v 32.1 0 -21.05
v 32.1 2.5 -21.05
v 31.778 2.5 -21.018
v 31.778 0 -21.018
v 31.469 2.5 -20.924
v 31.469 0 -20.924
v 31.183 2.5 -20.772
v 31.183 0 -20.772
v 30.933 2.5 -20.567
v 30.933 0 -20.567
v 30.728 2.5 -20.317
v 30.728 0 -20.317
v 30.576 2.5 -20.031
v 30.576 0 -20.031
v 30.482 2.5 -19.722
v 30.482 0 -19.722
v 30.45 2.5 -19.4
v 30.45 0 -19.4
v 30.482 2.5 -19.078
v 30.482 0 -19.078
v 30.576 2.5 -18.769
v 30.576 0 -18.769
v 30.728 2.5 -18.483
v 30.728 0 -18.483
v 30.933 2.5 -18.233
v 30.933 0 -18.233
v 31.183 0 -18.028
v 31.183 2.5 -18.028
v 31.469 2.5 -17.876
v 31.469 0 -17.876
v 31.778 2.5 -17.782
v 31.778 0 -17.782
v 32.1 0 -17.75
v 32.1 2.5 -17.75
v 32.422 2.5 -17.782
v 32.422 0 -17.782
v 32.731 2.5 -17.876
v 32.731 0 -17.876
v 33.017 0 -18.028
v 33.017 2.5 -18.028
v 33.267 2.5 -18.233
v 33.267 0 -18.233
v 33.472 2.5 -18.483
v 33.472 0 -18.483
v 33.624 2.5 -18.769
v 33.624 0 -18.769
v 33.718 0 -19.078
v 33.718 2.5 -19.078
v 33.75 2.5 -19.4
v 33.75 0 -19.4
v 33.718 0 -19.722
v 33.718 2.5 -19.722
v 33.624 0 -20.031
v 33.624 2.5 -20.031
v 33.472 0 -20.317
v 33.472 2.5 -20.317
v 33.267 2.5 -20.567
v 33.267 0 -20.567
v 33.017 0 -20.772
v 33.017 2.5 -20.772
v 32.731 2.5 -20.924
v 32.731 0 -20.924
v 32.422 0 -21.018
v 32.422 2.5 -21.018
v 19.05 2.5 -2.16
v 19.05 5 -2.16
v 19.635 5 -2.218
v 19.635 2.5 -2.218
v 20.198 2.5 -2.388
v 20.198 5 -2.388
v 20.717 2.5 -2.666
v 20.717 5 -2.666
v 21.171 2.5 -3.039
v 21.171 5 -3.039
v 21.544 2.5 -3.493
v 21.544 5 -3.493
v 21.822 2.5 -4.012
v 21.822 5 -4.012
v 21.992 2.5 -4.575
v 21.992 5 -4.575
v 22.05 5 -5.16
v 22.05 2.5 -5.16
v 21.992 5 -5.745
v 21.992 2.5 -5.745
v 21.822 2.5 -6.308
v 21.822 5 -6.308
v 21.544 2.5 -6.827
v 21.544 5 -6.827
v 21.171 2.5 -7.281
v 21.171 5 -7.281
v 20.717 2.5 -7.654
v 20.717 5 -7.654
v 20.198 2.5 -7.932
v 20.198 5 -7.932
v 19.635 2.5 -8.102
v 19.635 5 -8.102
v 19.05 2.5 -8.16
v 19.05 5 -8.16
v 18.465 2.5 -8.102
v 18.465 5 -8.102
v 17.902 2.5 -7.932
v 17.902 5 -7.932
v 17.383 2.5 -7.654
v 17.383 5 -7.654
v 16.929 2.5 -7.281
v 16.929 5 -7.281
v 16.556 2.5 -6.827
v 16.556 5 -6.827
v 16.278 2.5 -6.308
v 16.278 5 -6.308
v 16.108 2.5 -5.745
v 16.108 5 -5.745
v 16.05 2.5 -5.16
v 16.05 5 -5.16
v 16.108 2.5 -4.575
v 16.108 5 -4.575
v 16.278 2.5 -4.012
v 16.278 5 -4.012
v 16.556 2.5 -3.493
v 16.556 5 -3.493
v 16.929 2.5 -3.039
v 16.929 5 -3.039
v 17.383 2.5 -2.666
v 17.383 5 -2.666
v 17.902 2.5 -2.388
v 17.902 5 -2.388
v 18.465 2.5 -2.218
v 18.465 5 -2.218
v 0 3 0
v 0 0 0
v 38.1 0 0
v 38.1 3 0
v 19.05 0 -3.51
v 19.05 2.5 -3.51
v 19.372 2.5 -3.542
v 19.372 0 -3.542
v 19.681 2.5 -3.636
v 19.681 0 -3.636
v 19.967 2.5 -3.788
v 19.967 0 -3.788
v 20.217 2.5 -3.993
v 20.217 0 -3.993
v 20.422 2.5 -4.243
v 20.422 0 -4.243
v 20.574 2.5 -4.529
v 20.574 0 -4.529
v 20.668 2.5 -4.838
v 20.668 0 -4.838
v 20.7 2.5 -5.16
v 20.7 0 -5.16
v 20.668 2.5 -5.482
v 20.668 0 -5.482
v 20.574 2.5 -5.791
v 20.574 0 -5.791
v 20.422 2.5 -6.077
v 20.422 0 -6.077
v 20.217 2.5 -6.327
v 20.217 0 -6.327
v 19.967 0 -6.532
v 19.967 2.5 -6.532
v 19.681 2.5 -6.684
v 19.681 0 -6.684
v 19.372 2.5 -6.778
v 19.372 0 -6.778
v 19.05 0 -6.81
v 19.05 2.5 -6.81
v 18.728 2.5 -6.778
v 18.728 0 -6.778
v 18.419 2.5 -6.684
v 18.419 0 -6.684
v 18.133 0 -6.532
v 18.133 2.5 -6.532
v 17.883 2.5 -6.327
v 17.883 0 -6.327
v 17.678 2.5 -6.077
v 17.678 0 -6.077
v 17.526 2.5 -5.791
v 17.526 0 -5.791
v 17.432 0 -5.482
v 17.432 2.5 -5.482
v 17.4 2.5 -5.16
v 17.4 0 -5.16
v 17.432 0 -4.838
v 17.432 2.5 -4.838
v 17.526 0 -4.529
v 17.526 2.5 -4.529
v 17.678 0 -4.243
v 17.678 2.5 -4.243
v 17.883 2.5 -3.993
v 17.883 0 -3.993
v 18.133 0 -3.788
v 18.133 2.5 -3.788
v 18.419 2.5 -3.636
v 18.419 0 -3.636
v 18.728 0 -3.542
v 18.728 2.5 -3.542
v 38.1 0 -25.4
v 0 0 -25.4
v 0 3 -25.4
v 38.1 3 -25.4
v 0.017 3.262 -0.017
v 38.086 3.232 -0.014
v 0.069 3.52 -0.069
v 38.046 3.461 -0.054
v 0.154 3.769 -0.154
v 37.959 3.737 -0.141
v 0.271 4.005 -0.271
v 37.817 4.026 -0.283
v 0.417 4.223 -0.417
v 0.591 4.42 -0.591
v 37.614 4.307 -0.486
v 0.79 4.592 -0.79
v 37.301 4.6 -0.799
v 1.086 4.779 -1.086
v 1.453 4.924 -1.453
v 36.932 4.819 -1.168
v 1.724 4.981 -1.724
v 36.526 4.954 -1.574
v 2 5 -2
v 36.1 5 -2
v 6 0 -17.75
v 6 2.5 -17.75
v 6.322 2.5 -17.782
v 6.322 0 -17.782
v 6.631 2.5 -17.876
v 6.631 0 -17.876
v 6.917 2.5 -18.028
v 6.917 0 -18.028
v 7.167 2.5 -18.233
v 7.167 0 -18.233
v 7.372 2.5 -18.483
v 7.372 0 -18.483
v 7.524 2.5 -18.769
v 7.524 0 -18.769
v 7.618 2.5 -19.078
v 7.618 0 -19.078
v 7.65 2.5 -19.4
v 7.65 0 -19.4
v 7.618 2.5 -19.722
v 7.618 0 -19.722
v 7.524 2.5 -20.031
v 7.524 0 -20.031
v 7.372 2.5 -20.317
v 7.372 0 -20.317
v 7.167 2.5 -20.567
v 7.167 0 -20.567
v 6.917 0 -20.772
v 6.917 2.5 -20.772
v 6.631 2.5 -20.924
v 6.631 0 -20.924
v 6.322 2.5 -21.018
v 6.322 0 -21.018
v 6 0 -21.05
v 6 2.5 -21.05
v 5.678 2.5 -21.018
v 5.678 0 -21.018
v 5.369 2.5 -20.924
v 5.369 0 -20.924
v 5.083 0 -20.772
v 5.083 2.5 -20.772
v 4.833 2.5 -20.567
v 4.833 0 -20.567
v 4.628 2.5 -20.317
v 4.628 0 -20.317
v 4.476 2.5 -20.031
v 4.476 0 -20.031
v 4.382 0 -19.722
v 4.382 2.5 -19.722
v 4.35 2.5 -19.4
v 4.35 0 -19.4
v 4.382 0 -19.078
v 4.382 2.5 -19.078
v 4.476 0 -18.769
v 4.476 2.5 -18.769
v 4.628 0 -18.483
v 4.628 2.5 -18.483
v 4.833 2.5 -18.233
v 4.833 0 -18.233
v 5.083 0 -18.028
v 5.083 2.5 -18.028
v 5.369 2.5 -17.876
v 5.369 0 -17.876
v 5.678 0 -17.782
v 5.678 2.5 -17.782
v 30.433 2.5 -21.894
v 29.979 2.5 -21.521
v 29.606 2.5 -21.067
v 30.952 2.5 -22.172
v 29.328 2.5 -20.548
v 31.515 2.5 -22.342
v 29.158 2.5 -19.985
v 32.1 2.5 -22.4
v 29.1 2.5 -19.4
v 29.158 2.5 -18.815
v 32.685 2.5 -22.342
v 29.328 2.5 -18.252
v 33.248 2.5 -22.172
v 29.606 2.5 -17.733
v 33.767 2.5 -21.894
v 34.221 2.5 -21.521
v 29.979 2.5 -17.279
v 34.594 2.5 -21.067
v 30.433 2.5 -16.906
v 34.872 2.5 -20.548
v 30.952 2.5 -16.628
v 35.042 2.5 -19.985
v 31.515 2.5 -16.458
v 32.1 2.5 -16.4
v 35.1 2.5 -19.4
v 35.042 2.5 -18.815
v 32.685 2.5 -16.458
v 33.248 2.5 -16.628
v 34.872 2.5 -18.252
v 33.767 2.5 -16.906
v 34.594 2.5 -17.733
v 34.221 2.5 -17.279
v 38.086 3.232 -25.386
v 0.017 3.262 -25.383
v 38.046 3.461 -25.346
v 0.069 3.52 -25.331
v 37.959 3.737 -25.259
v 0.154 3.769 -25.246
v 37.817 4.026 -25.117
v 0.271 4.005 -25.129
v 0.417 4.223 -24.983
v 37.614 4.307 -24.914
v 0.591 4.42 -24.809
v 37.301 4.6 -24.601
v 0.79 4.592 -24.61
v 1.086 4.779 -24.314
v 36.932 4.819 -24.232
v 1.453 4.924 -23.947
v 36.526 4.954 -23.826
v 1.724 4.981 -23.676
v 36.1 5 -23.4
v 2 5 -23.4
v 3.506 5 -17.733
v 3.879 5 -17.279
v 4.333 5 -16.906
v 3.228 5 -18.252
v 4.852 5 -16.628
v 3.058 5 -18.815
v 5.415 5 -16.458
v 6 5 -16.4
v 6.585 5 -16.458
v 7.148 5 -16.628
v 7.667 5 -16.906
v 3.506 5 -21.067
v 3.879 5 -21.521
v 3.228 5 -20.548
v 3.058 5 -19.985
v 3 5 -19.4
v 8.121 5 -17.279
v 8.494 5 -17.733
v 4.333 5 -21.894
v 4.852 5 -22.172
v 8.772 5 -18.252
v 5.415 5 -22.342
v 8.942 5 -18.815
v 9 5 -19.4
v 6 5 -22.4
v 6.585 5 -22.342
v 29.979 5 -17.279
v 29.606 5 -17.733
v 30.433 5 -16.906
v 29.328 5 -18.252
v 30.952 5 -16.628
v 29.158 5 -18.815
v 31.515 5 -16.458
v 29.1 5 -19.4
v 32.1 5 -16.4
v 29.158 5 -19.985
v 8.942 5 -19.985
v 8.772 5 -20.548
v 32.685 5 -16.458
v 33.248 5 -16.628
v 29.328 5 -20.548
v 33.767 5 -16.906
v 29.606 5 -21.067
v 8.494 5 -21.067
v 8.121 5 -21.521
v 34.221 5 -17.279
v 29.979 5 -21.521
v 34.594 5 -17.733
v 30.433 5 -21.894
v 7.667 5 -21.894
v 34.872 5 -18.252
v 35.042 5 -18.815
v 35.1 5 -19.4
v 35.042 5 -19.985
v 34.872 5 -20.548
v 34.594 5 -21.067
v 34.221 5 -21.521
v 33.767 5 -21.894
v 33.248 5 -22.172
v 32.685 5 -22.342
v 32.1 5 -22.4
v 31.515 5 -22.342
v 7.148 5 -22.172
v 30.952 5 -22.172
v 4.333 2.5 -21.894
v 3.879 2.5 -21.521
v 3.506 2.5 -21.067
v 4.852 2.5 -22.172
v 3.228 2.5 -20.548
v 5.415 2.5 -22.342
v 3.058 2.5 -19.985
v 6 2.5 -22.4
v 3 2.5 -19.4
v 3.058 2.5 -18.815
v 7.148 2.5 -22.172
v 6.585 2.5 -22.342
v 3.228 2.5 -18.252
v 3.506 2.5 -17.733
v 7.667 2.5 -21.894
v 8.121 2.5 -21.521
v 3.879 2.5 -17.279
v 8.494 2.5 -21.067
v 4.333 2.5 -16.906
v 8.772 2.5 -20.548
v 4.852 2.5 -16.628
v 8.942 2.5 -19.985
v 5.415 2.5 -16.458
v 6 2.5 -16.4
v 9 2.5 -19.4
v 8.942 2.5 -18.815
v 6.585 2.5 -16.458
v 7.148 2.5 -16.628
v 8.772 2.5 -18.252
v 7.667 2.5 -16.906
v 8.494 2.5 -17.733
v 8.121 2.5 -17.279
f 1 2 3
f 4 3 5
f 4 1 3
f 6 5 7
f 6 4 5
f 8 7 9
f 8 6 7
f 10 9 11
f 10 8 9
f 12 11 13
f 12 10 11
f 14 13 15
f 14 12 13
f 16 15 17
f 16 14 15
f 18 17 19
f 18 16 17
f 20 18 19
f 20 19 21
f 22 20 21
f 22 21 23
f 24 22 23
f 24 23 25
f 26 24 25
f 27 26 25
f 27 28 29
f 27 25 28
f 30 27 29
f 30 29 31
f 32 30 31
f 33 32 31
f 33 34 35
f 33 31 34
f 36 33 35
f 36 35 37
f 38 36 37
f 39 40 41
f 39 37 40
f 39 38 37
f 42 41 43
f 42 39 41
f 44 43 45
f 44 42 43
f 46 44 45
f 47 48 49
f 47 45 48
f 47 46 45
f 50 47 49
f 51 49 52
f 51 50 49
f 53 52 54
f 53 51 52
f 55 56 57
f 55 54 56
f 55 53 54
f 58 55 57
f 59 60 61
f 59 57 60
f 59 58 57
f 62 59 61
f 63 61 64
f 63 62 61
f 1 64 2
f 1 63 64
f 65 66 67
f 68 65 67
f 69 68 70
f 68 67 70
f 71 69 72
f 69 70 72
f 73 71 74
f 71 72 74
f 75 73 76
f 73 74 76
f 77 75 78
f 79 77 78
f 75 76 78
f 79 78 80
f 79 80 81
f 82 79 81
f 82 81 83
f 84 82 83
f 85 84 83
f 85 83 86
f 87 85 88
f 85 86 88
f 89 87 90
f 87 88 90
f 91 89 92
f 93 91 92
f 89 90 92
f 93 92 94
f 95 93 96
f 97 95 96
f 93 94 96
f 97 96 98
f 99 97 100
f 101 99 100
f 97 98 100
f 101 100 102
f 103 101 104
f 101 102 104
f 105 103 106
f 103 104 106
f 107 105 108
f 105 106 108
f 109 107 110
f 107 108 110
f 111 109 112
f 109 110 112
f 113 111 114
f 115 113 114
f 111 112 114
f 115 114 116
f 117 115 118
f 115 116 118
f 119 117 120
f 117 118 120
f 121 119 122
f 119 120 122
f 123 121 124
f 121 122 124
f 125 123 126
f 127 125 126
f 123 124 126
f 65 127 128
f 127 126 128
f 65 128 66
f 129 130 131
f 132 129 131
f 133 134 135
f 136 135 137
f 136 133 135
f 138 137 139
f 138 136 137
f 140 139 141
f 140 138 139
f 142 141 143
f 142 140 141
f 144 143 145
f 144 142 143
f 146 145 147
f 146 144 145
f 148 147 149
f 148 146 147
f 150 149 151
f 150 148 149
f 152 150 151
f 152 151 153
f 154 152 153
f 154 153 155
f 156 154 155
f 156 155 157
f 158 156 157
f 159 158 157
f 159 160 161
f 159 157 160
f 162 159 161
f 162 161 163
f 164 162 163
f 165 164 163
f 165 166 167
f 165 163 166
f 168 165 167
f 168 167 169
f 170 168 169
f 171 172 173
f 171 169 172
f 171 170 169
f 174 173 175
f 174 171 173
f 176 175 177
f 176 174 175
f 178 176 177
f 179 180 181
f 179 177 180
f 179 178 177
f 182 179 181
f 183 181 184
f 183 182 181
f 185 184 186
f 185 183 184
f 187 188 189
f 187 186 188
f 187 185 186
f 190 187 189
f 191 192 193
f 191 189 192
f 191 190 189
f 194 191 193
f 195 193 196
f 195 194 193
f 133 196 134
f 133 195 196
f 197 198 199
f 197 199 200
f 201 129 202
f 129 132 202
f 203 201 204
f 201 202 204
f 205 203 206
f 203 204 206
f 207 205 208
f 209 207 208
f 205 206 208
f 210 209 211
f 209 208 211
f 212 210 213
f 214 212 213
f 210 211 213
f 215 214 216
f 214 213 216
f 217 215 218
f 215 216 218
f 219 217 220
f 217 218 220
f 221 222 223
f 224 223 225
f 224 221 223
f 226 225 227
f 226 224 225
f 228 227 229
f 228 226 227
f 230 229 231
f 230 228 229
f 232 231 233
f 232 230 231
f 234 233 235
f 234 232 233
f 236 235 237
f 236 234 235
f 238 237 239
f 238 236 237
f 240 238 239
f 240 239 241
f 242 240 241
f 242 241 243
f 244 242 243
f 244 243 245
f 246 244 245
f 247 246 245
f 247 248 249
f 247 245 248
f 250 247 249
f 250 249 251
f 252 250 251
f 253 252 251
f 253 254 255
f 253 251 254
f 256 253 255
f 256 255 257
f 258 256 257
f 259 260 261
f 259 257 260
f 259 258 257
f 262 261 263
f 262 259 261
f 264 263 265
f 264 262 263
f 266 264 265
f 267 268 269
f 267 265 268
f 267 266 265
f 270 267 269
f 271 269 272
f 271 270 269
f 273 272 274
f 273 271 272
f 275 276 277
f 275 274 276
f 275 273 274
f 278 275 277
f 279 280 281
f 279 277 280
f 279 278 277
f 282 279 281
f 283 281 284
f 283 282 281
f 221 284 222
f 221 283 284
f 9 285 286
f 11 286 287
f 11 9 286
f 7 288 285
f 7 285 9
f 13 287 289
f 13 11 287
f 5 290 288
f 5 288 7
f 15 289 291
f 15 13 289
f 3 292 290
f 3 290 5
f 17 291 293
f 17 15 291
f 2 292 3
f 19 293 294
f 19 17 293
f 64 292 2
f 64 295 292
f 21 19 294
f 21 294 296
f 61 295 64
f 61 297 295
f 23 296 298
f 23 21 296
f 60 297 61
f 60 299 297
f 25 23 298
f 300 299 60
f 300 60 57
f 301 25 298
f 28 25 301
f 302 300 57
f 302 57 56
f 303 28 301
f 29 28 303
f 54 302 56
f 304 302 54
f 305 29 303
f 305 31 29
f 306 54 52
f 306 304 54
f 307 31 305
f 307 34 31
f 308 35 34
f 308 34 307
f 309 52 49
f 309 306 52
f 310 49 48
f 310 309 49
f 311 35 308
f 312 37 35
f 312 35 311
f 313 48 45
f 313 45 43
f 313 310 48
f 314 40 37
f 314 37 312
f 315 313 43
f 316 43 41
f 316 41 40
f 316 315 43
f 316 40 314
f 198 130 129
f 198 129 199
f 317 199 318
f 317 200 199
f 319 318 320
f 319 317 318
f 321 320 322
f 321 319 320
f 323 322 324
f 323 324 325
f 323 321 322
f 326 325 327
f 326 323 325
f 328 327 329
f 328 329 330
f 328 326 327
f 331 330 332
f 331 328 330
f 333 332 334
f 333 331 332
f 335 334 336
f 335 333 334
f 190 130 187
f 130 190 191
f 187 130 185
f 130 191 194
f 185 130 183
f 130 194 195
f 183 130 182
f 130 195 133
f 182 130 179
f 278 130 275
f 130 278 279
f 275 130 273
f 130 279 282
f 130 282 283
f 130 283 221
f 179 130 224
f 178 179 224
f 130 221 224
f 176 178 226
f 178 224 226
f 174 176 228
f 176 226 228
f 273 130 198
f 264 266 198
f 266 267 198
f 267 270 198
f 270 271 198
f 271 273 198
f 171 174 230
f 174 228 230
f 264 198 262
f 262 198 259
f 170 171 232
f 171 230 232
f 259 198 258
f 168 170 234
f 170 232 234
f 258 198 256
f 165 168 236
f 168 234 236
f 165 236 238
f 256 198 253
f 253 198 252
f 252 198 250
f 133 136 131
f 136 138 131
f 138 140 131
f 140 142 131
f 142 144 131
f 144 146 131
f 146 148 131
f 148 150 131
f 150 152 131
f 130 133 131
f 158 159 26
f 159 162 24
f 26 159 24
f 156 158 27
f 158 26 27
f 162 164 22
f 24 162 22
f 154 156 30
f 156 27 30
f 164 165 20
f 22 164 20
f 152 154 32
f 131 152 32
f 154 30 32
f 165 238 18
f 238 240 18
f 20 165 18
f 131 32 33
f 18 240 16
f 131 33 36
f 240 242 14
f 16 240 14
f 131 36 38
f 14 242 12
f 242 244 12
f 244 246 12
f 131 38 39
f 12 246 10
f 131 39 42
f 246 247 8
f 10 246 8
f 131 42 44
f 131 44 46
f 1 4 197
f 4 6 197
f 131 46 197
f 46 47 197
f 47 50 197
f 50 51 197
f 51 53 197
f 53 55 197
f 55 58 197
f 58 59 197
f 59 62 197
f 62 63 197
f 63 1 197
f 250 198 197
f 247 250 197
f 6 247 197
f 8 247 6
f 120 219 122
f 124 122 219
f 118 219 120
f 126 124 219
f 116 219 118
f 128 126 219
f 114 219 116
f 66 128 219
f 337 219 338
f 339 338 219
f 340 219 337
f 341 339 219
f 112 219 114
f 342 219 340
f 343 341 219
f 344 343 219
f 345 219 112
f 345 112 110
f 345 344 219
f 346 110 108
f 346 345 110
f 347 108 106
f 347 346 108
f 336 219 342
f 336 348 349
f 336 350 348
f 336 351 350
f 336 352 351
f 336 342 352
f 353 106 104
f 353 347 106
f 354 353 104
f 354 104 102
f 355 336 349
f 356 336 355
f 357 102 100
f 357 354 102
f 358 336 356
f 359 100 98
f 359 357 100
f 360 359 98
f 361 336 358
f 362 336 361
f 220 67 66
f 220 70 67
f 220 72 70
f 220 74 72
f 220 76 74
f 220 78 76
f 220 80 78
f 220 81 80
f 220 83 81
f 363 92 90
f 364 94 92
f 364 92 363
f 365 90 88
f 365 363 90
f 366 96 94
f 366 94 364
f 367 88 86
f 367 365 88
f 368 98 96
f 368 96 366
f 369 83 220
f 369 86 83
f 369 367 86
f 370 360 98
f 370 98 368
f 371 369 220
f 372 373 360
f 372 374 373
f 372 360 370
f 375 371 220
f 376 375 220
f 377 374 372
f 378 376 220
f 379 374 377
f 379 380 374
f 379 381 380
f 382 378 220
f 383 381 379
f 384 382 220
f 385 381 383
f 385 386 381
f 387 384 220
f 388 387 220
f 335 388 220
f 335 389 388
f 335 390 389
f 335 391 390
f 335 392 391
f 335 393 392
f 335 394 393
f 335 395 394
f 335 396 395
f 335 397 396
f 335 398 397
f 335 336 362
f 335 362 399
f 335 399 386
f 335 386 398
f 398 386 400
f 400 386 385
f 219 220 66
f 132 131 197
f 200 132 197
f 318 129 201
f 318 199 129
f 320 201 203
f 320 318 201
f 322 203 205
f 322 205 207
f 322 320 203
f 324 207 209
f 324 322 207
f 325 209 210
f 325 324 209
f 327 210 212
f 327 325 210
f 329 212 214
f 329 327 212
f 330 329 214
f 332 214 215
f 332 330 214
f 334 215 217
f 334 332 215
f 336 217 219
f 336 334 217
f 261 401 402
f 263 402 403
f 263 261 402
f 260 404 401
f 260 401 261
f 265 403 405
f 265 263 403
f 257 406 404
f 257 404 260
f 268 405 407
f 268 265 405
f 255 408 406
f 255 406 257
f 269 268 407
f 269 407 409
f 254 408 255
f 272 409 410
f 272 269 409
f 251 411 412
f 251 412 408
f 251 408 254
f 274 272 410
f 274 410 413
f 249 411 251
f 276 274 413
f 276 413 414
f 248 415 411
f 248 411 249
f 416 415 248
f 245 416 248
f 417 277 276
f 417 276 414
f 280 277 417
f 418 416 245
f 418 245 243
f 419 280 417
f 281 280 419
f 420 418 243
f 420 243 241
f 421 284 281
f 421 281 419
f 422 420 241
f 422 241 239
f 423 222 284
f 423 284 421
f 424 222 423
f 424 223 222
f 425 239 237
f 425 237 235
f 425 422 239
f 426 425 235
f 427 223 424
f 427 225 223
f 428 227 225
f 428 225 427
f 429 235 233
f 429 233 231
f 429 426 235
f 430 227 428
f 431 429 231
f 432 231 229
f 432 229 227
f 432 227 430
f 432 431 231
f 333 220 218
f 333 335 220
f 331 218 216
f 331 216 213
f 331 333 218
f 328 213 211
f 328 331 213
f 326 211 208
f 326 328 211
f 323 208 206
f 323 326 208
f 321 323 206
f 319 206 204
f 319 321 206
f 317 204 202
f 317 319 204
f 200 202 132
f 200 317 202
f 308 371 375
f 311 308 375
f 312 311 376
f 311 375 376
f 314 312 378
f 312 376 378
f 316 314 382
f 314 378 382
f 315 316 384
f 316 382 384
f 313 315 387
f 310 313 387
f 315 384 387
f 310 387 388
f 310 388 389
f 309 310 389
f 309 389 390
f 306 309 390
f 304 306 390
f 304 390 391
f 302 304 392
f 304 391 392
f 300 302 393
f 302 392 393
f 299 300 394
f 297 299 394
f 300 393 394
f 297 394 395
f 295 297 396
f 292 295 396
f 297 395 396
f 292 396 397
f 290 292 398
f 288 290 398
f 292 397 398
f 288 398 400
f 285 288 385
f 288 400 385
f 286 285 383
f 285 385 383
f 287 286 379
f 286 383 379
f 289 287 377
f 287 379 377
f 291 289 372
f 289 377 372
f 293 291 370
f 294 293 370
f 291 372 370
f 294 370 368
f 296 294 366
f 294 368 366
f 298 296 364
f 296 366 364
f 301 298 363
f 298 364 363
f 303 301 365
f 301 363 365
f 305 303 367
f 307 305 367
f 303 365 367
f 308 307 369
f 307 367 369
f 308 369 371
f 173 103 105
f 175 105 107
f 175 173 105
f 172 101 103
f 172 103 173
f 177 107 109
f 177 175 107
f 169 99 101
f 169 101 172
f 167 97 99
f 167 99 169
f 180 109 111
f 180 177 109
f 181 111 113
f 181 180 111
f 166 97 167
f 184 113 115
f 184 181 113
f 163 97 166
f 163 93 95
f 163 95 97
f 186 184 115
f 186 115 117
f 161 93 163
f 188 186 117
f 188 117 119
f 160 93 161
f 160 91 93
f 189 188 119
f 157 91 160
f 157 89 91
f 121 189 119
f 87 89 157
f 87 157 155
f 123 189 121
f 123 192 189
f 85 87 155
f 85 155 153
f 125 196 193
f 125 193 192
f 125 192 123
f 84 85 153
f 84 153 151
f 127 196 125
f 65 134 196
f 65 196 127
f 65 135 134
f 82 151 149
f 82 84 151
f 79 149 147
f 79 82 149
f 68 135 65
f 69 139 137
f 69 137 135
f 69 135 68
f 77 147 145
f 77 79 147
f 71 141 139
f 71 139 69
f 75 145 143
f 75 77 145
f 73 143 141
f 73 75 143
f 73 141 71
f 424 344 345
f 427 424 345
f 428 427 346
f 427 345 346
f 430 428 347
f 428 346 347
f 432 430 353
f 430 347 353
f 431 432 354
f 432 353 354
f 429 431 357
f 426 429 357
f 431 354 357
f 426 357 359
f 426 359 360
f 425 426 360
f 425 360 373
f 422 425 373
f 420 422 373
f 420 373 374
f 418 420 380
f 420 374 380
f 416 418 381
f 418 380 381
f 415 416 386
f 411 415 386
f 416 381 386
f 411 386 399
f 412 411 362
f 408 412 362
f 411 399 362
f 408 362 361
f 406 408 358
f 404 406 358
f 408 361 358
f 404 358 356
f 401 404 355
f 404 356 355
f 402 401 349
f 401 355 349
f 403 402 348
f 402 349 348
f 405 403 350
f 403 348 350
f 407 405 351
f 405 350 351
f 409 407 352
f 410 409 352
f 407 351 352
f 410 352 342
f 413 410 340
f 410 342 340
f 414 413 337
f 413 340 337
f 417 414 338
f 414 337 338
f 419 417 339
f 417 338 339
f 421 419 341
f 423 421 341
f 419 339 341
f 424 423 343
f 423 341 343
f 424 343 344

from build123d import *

# Parameters (mm, degrees)
SKETCH1_W           = 38.1
SKETCH1_H           = 25.4
SKETCH1_R           = 1.65
BOSS_EXTRUDE1_DEPTH = 5
SKETCH2_R           = 3
CUT_EXTRUDE1_DEPTH  = 2.5
FILLET1_R           = 2


with BuildPart() as part:
    # Sketch1 → Boss-Extrude1 (new body)
    with BuildSketch(Plane(origin=(0, 0, 0), x_dir=(1, 0, 0), z_dir=(0, 1, 0))):
        with Locations((19.05, 12.7)):
            Rectangle(SKETCH1_W, SKETCH1_H)
        with Locations(Location((19.05, 5.16, 0), (0, 0, 270))):
            Circle(SKETCH1_R, mode=Mode.SUBTRACT)
        with Locations(Location((6, 19.4, 0), (0, 0, 270))):
            Circle(SKETCH1_R, mode=Mode.SUBTRACT)
        with Locations(Location((32.1, 19.4, 0), (0, 0, 90))):
            Circle(SKETCH1_R, mode=Mode.SUBTRACT)
    extrude(amount=BOSS_EXTRUDE1_DEPTH)

    # Sketch2 → Cut-Extrude1 (cut)
    with BuildSketch(Plane(origin=(0, 5, 0), x_dir=(1, 0, 0), z_dir=(0, 1, 0))):
        with Locations(Location((6, 19.4, 0), (0, 0, 270))):
            Circle(SKETCH2_R)
        with Locations(Location((19.05, 5.16, 0), (0, 0, 270))):
            Circle(SKETCH2_R)
        with Locations(Location((32.1, 19.4, 0), (0, 0, 270))):
            Circle(SKETCH2_R)
    extrude(amount=-CUT_EXTRUDE1_DEPTH, mode=Mode.SUBTRACT)

    # Fillet1
    fillet1_edges = [part.edges().sort_by_distance(p)[0] for p in [
        (38.1, 5, -12.7),
        (19.05, 5, -25.4),
        (0, 5, -12.7),
        (19.05, 5, 0),
    ]]
    fillet(fillet1_edges, radius=FILLET1_R)


solid = part.part
